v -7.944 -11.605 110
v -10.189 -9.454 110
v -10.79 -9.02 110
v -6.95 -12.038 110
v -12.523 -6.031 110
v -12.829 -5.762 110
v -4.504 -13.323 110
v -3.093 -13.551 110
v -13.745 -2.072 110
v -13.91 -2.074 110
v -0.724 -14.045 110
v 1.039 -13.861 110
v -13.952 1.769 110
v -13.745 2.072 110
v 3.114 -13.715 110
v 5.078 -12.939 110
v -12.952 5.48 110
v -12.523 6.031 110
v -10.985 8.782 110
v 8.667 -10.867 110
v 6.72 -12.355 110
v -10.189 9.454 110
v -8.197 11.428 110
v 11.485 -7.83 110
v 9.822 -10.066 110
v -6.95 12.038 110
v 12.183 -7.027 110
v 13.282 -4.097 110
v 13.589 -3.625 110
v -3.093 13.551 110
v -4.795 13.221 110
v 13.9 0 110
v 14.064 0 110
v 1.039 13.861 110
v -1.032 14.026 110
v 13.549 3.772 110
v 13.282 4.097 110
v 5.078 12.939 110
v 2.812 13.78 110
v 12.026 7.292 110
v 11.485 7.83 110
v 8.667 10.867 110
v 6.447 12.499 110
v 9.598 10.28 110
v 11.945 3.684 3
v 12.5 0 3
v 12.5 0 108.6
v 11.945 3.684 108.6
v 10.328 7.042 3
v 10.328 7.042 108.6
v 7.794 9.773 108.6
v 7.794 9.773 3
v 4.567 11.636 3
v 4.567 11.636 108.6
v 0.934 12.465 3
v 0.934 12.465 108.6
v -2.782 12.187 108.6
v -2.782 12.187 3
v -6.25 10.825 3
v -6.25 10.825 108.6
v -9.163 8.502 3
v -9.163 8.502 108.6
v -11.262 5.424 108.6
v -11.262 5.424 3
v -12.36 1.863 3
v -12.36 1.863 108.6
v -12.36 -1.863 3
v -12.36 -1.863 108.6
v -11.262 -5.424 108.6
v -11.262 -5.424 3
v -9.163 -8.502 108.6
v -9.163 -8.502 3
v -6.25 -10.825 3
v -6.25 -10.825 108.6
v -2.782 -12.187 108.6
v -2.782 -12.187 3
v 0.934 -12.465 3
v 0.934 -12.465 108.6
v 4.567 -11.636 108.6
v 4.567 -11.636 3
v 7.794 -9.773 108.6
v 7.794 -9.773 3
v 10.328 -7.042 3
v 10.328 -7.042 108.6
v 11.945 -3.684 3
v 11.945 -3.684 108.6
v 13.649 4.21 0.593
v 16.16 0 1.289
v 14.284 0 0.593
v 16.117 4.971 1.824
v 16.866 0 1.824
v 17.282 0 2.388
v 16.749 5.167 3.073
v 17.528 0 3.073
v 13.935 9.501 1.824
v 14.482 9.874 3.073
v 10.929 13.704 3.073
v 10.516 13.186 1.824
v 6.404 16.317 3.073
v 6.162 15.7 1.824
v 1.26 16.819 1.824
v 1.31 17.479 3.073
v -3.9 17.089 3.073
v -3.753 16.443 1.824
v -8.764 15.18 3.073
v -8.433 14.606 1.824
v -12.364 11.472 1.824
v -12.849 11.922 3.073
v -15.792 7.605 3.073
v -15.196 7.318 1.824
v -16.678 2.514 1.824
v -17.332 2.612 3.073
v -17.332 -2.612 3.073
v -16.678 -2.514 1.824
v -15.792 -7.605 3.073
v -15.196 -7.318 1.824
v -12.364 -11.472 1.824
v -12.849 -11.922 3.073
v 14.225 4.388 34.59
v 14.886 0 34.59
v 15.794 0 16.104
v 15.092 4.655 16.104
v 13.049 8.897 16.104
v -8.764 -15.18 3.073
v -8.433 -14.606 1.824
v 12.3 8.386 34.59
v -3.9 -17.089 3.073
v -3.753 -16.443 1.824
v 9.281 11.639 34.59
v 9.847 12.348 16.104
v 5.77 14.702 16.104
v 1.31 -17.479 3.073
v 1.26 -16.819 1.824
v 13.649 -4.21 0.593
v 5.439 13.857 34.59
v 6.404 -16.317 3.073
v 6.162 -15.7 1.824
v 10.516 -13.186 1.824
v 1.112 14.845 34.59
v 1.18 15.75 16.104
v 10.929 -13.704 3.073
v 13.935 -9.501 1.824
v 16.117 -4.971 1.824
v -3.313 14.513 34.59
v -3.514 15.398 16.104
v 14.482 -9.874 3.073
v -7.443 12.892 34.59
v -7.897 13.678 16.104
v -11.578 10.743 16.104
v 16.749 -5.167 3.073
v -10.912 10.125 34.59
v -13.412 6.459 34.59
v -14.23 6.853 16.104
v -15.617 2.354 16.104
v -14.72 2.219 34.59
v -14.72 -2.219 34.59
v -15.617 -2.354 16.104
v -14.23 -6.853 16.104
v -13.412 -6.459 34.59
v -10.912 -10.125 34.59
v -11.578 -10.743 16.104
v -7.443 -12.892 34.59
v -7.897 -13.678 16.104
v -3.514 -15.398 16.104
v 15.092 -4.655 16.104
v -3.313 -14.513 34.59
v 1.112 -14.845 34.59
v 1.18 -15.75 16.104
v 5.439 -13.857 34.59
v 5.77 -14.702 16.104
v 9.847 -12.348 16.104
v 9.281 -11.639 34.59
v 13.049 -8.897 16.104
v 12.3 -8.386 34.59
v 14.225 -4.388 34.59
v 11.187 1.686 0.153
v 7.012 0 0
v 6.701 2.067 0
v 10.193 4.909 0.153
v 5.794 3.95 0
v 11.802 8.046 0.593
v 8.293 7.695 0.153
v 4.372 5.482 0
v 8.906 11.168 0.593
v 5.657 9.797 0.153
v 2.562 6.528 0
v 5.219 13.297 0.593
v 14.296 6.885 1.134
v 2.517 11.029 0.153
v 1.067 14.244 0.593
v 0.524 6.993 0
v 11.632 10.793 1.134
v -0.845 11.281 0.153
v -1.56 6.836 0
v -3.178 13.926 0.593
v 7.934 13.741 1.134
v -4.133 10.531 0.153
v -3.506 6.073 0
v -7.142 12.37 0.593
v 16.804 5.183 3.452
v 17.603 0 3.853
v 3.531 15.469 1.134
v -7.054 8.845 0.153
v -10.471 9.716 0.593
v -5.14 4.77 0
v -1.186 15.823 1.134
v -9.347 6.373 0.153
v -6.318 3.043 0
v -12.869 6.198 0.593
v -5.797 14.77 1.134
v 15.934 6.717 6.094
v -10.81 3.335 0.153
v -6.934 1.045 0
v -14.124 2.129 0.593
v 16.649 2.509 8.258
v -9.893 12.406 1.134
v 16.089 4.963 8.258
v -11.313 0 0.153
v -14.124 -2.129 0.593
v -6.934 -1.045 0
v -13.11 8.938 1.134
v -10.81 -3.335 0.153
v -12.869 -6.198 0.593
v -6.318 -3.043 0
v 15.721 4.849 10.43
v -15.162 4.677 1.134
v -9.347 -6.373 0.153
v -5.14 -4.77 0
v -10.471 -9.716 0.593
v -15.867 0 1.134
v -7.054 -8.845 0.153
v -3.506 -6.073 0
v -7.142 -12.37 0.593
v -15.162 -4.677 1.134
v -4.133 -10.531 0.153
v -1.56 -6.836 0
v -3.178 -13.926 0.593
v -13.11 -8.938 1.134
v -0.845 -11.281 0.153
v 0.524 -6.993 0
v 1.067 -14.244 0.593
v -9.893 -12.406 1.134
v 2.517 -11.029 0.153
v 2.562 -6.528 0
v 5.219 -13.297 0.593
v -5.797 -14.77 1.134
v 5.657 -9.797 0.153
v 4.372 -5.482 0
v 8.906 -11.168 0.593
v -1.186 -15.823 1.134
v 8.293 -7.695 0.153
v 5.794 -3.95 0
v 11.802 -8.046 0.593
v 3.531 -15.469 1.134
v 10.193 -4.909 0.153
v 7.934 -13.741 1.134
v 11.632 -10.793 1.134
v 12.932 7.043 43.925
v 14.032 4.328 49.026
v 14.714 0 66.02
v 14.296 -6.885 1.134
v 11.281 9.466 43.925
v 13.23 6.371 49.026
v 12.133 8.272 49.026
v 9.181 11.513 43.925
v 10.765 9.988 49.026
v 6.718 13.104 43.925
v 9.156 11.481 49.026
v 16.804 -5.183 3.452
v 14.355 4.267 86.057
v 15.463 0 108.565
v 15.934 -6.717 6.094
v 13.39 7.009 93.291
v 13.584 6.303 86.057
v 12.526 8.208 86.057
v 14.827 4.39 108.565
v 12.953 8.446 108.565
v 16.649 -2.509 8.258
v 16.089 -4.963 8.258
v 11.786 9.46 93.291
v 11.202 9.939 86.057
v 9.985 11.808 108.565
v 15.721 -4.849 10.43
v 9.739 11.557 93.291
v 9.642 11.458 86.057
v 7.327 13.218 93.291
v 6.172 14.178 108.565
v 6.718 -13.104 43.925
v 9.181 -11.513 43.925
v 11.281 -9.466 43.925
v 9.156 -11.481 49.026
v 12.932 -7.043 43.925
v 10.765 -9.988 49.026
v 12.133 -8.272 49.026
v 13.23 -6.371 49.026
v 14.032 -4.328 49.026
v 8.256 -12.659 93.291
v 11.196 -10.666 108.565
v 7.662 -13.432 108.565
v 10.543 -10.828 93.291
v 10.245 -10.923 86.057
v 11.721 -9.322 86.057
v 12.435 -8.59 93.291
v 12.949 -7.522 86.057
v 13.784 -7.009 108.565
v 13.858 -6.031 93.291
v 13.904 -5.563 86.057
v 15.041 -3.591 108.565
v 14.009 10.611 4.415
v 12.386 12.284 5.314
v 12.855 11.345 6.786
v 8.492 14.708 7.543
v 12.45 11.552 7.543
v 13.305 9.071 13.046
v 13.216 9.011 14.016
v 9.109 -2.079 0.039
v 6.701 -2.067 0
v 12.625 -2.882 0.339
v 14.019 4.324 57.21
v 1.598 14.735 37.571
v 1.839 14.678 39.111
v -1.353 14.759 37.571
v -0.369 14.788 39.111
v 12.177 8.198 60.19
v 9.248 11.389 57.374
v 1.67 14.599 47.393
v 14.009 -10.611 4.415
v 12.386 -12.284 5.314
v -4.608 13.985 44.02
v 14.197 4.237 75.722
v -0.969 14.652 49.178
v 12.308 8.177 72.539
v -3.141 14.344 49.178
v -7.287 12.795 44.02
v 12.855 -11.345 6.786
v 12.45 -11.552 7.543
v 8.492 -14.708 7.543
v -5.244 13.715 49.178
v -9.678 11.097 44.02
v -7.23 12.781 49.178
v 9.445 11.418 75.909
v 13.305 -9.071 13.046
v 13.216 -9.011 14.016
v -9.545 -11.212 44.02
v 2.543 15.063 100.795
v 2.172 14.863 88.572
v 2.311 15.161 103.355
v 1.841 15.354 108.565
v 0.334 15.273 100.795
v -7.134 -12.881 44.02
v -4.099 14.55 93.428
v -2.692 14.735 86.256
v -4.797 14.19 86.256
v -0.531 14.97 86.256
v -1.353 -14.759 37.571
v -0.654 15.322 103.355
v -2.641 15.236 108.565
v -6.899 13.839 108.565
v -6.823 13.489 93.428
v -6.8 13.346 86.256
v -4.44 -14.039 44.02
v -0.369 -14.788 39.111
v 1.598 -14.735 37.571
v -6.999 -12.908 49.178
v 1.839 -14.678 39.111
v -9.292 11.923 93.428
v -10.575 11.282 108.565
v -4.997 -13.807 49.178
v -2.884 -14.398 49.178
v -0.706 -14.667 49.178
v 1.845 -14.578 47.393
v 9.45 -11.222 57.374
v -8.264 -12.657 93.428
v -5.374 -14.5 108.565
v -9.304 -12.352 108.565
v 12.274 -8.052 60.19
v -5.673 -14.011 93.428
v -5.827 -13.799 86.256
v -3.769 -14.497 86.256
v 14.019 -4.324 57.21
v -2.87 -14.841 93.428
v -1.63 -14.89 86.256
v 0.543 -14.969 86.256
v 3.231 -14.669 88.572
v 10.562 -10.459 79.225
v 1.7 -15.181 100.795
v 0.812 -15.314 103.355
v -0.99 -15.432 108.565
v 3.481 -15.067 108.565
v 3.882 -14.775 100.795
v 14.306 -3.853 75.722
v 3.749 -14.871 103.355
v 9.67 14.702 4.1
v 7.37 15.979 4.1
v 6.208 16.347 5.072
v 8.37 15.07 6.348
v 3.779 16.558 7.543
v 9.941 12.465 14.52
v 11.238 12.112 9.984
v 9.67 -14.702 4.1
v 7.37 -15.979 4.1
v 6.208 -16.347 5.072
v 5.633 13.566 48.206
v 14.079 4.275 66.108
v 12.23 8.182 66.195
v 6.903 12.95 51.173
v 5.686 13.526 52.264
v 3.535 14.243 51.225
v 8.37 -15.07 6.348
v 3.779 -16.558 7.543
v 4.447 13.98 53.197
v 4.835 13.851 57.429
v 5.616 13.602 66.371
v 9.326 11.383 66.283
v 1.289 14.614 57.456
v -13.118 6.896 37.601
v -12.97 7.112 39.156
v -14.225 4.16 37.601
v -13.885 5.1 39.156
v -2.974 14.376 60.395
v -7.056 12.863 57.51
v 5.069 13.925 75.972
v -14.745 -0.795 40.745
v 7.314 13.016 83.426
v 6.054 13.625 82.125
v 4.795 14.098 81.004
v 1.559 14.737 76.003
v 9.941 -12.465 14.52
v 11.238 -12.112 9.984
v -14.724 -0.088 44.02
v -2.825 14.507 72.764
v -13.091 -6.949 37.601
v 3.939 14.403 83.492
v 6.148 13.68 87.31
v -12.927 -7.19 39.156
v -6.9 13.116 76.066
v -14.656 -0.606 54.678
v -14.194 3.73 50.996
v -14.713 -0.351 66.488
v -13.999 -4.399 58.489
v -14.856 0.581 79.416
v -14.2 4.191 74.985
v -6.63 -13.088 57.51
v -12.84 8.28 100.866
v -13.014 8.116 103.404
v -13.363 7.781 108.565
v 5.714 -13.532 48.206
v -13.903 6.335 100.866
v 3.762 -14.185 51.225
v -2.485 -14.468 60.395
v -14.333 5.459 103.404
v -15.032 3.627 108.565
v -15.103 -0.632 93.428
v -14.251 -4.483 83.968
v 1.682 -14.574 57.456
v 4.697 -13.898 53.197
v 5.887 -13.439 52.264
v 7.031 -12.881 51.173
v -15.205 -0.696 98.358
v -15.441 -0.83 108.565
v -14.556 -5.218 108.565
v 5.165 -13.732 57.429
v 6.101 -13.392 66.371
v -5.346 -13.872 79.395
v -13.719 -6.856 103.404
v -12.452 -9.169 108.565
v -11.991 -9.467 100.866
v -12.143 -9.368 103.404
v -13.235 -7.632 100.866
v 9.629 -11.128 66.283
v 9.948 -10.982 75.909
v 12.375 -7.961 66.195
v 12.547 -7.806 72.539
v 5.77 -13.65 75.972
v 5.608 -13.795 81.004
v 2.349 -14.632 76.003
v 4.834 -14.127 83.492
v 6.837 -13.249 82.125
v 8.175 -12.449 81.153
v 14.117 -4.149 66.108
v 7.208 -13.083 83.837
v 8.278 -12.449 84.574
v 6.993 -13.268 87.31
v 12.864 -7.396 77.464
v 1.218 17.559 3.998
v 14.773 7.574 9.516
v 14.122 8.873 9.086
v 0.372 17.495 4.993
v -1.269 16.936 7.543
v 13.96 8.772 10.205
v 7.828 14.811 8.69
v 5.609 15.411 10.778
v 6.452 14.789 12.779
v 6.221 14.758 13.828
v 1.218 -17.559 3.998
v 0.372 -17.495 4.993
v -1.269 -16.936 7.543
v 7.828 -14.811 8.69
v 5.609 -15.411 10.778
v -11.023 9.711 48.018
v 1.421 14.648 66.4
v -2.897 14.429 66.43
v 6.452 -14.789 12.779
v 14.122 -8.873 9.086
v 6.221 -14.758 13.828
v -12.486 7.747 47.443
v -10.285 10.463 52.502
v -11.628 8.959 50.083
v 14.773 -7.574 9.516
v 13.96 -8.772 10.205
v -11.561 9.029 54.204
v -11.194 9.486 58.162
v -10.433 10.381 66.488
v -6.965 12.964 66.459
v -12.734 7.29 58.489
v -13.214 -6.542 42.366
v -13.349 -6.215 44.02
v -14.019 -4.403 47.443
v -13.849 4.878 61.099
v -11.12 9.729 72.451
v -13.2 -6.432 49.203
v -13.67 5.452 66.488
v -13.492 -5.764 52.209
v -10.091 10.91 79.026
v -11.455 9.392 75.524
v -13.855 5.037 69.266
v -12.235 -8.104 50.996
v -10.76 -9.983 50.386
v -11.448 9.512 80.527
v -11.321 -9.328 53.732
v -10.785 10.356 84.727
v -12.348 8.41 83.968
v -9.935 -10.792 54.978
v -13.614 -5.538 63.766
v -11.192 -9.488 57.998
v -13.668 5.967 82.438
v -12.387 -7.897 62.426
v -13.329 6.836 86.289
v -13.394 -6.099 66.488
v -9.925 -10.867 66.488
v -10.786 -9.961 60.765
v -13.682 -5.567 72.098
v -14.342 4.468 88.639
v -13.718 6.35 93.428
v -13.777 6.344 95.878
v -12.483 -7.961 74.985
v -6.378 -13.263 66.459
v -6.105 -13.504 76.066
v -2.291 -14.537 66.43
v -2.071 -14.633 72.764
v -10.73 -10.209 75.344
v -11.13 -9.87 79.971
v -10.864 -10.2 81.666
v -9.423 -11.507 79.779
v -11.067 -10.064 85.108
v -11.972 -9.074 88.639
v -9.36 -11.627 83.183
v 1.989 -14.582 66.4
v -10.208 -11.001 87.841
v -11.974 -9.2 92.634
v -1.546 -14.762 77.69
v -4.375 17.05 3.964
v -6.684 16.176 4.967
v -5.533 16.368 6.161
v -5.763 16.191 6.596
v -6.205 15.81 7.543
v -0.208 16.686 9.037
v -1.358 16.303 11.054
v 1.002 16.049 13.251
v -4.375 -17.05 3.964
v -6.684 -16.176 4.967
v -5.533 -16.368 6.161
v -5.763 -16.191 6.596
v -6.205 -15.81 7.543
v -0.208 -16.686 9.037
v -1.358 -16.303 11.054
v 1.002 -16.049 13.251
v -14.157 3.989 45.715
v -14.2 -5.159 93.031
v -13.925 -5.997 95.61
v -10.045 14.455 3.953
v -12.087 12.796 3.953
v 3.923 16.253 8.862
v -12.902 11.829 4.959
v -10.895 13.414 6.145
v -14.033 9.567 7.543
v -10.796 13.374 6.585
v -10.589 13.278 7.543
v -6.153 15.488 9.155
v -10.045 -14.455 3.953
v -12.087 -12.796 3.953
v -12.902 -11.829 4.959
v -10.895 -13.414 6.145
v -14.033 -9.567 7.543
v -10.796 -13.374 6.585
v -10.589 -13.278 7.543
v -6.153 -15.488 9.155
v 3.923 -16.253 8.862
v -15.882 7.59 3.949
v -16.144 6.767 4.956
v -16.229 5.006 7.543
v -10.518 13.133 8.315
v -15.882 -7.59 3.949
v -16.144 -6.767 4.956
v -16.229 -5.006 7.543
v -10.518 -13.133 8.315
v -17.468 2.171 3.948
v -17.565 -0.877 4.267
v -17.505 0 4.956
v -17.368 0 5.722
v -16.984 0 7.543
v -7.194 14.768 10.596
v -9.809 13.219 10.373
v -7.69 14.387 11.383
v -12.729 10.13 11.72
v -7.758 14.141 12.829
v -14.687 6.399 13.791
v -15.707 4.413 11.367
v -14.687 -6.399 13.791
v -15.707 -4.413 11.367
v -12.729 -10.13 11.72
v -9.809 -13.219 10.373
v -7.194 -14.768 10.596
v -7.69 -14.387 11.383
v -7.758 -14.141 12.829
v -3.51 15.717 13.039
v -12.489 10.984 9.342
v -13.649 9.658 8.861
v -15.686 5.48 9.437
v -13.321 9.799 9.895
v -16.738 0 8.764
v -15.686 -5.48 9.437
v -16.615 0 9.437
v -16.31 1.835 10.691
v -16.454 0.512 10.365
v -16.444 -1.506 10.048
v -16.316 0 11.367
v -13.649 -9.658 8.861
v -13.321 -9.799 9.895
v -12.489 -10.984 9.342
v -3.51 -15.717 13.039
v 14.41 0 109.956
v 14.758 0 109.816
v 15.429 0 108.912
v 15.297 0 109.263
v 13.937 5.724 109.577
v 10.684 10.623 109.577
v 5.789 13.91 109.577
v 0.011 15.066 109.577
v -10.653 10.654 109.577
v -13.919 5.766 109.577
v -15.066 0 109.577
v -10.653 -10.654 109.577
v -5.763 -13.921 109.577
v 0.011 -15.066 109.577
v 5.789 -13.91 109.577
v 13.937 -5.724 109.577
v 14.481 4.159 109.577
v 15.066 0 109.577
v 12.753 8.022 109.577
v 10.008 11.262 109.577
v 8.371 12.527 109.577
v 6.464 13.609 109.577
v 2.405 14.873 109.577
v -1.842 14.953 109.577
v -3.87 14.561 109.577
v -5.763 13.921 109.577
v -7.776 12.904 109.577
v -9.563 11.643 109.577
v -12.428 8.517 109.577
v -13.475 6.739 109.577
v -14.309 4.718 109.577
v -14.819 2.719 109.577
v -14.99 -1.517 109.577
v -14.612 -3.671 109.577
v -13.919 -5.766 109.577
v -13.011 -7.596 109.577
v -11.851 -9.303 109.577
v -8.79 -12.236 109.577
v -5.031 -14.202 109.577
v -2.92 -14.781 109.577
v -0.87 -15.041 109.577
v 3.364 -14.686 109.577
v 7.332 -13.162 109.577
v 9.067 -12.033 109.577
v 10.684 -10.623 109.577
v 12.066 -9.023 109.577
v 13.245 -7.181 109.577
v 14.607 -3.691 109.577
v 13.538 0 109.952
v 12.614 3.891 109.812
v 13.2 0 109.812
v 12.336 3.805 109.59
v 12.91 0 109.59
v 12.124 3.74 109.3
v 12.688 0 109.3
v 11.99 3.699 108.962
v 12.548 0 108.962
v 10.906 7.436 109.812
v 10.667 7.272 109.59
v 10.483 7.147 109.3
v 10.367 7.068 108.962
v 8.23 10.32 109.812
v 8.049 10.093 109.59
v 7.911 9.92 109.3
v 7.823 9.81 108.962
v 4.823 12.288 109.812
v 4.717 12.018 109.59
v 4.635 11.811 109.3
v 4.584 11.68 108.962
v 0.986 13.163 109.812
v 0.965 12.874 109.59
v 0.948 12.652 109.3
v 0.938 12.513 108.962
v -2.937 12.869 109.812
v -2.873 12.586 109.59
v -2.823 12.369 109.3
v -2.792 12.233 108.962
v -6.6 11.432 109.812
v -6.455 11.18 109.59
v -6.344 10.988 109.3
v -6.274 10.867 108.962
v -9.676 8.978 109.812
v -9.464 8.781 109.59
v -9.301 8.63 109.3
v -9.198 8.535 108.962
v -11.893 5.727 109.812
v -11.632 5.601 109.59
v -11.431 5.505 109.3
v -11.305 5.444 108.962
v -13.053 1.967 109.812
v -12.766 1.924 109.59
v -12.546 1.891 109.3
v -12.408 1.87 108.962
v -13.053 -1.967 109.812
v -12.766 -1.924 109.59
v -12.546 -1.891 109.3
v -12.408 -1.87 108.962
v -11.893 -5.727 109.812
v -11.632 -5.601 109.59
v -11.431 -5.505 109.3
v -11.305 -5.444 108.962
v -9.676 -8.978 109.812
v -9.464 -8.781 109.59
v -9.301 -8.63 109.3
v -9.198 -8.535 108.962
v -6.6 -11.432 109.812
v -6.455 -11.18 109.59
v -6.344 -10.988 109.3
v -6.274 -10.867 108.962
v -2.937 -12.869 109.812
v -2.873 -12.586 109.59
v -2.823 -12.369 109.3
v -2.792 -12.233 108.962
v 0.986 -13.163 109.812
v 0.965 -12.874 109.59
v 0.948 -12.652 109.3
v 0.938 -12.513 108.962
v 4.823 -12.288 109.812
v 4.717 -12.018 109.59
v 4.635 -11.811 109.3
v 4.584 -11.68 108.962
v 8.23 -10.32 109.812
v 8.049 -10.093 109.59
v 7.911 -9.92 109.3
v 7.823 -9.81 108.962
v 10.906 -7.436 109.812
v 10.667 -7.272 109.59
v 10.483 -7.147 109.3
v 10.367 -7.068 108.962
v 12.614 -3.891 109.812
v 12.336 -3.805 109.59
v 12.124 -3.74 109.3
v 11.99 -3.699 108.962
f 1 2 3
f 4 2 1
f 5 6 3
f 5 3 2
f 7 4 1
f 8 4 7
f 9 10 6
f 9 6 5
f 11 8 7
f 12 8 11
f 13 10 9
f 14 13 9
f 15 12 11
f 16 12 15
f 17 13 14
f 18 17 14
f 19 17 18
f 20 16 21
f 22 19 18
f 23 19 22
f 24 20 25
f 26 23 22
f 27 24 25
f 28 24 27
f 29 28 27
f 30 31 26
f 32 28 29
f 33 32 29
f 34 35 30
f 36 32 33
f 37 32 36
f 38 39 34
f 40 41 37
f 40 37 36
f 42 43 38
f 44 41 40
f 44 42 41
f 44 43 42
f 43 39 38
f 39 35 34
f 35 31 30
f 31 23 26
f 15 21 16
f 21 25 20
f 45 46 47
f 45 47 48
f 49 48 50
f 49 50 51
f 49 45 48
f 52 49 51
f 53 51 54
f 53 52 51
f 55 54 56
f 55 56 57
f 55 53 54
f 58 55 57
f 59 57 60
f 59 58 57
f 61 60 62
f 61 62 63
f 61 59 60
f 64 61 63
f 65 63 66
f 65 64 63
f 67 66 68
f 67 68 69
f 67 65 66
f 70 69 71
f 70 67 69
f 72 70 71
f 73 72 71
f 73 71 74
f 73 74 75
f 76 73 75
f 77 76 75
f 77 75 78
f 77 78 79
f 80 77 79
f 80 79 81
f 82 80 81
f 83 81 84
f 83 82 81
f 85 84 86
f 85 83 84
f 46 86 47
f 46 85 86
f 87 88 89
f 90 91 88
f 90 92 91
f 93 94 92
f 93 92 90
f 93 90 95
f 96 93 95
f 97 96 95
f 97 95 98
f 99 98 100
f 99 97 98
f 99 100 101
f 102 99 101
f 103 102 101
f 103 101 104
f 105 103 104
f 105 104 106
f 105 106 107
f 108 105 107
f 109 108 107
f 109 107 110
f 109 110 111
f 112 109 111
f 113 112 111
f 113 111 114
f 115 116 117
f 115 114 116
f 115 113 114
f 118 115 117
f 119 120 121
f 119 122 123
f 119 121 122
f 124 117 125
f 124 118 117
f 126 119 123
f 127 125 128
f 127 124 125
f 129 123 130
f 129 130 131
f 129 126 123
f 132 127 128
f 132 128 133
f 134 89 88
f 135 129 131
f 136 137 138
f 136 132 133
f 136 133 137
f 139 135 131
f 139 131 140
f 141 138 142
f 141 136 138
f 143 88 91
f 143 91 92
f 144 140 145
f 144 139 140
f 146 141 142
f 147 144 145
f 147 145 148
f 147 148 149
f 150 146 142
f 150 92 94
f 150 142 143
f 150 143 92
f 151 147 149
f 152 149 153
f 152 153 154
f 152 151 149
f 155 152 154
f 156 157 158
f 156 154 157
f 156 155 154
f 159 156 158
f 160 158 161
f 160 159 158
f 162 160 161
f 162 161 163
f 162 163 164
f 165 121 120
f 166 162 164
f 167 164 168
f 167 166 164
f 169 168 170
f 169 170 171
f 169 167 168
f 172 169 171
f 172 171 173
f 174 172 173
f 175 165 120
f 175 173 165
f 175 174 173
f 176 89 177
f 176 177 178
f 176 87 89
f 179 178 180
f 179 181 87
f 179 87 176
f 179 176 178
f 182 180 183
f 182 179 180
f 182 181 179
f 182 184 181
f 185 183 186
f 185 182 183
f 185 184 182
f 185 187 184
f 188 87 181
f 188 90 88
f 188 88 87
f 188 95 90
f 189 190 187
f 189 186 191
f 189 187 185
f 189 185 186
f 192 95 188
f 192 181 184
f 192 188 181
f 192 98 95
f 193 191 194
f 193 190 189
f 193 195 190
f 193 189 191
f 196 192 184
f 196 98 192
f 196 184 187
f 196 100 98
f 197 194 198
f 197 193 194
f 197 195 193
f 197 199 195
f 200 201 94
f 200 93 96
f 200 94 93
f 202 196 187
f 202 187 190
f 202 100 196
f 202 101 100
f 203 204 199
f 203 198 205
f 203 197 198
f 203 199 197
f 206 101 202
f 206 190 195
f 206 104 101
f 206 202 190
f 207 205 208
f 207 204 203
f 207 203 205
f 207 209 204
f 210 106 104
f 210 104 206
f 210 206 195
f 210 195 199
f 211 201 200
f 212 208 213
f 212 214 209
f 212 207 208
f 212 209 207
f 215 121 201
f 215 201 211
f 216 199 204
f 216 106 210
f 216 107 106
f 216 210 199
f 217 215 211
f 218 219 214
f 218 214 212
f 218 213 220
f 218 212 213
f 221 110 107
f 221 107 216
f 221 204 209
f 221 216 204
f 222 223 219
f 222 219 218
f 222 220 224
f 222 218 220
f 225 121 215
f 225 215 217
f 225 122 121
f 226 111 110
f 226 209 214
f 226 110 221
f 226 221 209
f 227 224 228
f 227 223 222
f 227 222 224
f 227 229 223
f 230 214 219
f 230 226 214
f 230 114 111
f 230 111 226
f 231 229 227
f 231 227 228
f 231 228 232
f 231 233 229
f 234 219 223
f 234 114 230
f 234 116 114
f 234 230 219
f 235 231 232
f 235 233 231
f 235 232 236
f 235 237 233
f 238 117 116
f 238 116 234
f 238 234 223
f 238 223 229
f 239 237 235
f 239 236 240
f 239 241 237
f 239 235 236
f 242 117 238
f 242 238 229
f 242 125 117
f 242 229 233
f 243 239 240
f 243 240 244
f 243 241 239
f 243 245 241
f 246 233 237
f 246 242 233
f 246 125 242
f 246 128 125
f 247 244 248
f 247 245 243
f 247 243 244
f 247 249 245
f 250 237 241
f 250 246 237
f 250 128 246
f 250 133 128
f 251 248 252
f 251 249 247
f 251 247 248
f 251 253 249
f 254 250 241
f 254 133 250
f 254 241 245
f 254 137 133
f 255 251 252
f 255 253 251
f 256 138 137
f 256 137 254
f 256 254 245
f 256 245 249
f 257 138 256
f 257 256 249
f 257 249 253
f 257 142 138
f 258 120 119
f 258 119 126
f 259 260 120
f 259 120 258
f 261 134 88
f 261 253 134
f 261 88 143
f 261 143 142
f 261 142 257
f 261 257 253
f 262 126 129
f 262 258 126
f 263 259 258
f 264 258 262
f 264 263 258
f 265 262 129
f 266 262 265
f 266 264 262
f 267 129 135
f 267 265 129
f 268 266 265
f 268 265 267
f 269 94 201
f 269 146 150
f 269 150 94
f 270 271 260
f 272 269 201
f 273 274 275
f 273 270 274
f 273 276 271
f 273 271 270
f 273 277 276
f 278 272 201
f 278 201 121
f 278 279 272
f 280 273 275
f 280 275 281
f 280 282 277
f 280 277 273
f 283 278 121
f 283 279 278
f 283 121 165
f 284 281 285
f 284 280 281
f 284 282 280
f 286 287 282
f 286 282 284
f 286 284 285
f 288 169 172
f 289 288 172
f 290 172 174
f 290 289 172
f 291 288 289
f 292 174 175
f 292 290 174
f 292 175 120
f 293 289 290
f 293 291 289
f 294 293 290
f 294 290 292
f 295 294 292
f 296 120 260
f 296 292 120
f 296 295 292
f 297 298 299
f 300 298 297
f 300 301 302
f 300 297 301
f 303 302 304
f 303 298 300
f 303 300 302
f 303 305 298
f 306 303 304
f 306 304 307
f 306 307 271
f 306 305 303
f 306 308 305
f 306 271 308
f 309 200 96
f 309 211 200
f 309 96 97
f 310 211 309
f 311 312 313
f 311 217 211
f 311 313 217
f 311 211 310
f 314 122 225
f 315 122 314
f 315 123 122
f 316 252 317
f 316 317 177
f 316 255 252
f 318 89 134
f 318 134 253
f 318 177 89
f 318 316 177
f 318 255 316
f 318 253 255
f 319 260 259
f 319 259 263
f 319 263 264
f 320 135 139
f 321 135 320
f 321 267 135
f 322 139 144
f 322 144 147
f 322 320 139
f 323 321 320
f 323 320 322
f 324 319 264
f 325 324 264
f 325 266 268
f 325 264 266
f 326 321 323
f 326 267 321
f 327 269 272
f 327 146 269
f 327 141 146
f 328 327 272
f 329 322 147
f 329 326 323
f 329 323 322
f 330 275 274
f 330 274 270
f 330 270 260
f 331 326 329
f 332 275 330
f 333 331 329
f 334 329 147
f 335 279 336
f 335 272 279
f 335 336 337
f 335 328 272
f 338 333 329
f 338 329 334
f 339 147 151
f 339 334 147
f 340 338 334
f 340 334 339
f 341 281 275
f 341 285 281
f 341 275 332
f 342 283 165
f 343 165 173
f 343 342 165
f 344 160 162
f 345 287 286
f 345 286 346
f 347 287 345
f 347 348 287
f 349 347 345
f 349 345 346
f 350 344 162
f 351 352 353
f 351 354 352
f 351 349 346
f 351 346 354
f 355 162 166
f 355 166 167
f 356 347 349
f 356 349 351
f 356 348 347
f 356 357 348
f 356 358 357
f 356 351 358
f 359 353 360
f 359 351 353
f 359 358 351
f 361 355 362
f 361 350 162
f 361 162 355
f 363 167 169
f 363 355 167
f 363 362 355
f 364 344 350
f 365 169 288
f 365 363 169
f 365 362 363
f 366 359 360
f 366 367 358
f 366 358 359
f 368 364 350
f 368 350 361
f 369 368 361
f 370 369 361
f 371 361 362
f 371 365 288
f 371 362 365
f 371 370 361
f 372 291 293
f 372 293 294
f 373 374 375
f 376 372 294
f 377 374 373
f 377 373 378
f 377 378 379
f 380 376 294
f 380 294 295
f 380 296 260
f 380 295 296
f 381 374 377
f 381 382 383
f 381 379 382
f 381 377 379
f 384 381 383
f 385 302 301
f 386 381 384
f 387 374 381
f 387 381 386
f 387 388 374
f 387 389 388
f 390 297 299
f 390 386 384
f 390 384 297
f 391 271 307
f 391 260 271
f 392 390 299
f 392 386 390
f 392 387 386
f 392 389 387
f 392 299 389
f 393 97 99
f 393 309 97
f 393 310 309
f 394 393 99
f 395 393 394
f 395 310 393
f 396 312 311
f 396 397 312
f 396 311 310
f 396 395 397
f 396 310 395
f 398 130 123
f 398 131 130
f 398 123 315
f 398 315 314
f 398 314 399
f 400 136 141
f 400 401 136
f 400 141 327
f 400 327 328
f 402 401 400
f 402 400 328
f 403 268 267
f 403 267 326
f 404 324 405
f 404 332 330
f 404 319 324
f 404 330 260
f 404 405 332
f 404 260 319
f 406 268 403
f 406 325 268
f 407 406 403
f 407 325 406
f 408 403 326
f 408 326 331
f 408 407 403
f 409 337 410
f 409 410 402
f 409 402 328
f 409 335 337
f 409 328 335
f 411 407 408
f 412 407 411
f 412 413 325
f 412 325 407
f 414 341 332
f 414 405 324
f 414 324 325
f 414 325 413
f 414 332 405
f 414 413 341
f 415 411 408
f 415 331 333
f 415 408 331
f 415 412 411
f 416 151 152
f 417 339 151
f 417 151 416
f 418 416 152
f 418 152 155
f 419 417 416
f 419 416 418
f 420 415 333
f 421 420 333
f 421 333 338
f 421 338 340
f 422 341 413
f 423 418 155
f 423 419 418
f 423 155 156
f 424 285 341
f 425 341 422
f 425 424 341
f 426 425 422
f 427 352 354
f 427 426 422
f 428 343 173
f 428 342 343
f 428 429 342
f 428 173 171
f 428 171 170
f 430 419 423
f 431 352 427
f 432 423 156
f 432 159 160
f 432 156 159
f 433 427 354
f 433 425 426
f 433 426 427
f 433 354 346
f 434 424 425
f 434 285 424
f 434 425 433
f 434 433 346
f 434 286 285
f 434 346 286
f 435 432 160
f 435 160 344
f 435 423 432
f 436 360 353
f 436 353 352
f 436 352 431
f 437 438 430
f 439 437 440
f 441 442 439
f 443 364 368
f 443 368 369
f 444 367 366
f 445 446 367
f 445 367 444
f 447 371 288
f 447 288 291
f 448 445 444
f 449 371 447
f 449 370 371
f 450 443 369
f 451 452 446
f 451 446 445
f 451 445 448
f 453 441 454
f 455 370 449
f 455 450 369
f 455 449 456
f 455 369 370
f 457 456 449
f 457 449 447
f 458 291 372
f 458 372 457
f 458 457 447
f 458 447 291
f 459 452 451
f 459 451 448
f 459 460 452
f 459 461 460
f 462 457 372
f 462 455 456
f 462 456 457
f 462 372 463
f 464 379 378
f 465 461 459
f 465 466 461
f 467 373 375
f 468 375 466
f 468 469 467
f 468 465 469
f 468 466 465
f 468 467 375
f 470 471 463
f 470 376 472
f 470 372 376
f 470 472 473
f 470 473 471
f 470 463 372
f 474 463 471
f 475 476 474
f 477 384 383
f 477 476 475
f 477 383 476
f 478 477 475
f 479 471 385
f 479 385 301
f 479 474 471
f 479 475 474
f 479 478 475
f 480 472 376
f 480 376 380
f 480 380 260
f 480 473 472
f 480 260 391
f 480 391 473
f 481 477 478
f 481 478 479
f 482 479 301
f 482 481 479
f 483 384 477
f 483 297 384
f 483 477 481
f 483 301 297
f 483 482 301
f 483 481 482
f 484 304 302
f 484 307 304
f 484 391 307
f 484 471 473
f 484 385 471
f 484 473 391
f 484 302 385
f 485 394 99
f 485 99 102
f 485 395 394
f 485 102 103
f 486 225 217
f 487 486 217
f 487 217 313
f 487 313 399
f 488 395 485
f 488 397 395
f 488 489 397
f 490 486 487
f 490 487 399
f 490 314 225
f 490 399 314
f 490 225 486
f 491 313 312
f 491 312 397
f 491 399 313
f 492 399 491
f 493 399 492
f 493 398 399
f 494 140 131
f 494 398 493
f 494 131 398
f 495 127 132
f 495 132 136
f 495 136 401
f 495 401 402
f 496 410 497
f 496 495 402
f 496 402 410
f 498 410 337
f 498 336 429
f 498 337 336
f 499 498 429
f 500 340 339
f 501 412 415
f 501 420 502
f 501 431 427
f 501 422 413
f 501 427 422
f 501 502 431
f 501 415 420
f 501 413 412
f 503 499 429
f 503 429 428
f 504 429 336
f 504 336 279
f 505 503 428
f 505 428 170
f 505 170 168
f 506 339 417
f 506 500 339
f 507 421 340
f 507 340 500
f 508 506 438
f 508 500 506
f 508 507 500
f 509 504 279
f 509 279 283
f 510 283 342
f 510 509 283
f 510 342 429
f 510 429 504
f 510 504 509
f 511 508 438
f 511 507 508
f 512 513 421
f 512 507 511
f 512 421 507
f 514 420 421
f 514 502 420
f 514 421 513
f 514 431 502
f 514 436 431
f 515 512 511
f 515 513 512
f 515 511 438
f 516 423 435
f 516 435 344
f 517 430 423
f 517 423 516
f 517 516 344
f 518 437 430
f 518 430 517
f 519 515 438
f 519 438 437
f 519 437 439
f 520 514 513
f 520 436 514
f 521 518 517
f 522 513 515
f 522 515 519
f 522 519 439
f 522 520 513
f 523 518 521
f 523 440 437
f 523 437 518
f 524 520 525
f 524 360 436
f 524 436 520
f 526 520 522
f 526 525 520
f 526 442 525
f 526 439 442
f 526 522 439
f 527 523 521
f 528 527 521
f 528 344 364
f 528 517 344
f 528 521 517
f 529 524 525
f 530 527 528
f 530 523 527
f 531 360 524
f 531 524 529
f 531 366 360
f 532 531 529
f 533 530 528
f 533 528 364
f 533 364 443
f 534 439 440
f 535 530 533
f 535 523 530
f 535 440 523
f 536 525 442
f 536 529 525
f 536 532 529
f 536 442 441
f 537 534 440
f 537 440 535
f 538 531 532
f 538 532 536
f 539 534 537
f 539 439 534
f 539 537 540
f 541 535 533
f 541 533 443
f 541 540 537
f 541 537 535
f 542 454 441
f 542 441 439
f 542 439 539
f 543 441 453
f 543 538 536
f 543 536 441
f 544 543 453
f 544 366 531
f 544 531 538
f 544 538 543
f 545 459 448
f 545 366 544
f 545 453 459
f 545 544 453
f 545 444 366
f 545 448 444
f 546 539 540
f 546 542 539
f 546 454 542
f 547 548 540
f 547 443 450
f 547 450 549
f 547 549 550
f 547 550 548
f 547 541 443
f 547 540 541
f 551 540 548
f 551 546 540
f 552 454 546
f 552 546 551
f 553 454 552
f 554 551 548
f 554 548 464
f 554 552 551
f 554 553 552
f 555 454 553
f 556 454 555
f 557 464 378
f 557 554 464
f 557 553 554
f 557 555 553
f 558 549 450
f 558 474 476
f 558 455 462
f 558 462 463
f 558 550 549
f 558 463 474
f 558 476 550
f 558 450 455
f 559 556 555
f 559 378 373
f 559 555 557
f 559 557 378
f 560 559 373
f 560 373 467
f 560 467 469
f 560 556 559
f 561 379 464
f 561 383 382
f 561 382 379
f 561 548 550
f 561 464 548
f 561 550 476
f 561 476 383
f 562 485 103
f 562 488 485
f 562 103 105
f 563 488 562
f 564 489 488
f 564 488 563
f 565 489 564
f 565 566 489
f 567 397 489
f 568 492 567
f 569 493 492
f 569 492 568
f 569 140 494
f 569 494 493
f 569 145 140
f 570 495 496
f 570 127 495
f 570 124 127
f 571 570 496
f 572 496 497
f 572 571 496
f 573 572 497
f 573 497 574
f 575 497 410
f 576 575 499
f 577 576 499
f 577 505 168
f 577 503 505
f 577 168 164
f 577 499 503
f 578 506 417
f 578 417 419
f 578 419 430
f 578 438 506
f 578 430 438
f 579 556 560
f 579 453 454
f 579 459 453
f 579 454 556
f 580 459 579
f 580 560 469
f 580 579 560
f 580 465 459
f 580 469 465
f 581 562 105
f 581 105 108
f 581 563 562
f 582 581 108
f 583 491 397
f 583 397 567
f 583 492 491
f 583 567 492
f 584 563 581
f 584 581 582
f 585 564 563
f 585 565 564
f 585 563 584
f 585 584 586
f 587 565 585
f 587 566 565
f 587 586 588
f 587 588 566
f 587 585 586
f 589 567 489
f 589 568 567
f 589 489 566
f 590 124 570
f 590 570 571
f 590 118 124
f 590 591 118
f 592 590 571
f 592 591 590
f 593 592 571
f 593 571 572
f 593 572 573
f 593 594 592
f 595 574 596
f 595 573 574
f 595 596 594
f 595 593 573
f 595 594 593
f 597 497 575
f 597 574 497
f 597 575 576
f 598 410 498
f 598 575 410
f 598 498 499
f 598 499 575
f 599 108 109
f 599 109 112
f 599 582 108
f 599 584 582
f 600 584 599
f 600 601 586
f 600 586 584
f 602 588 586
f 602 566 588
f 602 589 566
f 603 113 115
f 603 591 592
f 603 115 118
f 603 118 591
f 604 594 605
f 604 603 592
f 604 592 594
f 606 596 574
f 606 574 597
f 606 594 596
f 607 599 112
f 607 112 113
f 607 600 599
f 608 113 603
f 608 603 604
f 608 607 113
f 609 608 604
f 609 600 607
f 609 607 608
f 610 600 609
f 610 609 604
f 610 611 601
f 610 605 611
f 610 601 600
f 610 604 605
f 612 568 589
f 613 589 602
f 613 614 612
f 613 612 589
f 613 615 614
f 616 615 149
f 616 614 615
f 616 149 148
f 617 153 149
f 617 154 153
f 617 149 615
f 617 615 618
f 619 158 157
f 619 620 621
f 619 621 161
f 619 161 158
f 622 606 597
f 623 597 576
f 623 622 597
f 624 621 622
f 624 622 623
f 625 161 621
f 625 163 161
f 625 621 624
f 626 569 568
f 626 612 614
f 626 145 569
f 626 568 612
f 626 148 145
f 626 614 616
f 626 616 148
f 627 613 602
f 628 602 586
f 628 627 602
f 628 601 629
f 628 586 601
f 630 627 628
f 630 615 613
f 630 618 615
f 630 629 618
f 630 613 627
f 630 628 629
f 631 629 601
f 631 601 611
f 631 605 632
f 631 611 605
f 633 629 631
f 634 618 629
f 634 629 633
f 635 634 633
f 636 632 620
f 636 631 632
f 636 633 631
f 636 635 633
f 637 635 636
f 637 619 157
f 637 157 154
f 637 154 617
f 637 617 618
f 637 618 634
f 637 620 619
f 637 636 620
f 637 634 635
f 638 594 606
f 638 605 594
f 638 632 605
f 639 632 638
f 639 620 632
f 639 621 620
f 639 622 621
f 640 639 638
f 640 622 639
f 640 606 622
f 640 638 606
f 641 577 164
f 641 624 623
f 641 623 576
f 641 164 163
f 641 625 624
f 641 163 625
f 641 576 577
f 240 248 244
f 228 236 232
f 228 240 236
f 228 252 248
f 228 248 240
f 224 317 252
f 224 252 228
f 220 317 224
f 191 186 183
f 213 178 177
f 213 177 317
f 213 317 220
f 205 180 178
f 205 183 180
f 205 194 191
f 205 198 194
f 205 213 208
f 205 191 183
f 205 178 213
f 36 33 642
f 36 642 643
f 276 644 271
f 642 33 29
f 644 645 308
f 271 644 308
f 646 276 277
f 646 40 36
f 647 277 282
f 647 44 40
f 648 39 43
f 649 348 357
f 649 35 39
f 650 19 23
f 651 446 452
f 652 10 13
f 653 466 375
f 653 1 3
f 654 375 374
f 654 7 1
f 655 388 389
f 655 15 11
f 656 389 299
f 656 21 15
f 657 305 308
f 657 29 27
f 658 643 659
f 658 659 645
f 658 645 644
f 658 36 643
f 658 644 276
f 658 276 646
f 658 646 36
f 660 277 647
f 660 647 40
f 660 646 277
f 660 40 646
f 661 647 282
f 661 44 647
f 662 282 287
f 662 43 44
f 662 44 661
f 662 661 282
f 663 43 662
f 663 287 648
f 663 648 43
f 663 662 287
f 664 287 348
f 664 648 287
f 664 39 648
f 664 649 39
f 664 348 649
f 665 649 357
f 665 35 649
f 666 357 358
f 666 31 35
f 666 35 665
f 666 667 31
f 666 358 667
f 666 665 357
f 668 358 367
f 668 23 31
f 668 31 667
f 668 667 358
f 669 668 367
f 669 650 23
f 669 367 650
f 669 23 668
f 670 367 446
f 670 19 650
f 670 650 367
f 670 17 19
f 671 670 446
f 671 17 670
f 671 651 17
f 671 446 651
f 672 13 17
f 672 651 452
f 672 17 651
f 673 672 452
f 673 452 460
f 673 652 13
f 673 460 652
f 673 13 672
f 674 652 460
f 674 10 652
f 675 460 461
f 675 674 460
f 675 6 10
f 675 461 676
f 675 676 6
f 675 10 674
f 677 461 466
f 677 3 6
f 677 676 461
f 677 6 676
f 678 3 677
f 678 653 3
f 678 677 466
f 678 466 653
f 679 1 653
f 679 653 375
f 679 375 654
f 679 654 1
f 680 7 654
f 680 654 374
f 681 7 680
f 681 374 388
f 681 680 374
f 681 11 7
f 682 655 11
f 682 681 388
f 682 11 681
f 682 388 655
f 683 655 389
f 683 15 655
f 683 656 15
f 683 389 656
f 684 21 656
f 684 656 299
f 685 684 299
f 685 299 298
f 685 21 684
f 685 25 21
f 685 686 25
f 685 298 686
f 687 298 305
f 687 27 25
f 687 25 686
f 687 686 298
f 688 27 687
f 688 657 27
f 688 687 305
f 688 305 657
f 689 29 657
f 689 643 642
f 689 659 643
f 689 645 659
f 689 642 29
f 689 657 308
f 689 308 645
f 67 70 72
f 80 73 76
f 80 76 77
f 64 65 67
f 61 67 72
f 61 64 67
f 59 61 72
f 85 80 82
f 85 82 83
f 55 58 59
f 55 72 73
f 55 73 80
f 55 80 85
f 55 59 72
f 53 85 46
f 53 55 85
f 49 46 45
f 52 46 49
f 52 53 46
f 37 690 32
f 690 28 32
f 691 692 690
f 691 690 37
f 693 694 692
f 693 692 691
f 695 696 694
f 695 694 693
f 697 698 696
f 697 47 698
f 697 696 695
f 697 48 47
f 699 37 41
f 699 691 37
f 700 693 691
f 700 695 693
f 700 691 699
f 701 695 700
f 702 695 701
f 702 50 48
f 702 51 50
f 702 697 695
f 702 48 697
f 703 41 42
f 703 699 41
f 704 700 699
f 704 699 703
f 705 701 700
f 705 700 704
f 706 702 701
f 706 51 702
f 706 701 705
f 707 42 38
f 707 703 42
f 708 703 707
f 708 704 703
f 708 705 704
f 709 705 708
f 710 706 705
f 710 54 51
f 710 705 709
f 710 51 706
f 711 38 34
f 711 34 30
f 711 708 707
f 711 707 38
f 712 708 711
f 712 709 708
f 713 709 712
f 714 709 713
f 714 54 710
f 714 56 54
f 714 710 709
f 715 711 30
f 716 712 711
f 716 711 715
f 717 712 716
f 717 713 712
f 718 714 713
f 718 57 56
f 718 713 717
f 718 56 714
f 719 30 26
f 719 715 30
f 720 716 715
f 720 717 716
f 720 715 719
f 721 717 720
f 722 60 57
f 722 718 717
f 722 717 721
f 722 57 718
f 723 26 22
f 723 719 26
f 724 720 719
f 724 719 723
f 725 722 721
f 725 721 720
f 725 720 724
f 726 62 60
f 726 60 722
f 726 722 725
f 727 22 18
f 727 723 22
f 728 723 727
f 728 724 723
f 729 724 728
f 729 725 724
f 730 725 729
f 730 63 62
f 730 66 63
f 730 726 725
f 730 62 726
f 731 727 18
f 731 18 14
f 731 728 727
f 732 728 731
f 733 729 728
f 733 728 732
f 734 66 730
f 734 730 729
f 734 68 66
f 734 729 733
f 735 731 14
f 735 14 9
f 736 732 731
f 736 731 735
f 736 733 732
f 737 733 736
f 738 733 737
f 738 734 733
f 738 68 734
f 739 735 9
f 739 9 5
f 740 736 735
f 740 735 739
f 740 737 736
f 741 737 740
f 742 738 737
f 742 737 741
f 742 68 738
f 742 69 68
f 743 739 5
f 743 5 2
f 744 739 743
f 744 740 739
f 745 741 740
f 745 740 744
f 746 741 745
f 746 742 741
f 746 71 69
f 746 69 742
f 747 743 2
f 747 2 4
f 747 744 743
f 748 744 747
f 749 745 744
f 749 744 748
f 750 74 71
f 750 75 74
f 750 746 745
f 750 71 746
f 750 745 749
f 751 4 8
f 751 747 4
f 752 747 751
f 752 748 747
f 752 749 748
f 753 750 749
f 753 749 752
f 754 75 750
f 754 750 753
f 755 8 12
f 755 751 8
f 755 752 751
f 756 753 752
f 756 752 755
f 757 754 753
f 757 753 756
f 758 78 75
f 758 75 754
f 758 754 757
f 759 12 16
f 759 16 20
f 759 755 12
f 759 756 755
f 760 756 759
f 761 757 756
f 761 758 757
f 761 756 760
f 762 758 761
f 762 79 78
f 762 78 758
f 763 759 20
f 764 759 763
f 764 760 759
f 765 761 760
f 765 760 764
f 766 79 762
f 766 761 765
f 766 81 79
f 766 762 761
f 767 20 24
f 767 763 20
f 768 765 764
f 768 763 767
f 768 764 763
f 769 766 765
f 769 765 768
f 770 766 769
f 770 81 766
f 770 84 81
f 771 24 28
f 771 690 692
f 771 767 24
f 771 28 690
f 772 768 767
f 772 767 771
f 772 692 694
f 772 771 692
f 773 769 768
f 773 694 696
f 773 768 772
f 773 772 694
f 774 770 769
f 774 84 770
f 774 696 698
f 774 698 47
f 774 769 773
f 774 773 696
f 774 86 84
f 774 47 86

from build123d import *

# Parameters (mm, degrees)
F2_R = 1.4


with BuildPart() as f1:
    # F0 (on Front) → F1 (revolve)
    with BuildSketch(Plane.XZ):
        with BuildLine():
            Line((15.5, 110), (12.5, 110))
            Line((12.5, 110), (12.5, 3))
            Line((12.5, 3), (0, 3))
            Line((0, 3), (0, 0))
            Line((0, 0), (7.0122866566, 0))
            add(Edge.make_bspline(
                [(7.0122866566, 0), (15.0093450272, 0), (18.7410407809, 2.1277590234), (14.434704448, 13.4428260048), (14.1639093859, 57.86953984), (15.5, 110)],
                knots=[0, 0, 0, 0, 0.2079043563, 0.3702721943, 1, 1, 1, 1], degree=3))
        make_face()
    revolve(axis=Axis((0, 0, 57.9248592257), (0, 0, 1)))

    # F2
    f2_edges = [f1.edges().sort_by_distance(p)[0] for p in [
        (-15.5, 0, 110),
        (-12.5, 0, 110),
    ]]
    fillet(f2_edges, radius=F2_R)


solid = f1.part
